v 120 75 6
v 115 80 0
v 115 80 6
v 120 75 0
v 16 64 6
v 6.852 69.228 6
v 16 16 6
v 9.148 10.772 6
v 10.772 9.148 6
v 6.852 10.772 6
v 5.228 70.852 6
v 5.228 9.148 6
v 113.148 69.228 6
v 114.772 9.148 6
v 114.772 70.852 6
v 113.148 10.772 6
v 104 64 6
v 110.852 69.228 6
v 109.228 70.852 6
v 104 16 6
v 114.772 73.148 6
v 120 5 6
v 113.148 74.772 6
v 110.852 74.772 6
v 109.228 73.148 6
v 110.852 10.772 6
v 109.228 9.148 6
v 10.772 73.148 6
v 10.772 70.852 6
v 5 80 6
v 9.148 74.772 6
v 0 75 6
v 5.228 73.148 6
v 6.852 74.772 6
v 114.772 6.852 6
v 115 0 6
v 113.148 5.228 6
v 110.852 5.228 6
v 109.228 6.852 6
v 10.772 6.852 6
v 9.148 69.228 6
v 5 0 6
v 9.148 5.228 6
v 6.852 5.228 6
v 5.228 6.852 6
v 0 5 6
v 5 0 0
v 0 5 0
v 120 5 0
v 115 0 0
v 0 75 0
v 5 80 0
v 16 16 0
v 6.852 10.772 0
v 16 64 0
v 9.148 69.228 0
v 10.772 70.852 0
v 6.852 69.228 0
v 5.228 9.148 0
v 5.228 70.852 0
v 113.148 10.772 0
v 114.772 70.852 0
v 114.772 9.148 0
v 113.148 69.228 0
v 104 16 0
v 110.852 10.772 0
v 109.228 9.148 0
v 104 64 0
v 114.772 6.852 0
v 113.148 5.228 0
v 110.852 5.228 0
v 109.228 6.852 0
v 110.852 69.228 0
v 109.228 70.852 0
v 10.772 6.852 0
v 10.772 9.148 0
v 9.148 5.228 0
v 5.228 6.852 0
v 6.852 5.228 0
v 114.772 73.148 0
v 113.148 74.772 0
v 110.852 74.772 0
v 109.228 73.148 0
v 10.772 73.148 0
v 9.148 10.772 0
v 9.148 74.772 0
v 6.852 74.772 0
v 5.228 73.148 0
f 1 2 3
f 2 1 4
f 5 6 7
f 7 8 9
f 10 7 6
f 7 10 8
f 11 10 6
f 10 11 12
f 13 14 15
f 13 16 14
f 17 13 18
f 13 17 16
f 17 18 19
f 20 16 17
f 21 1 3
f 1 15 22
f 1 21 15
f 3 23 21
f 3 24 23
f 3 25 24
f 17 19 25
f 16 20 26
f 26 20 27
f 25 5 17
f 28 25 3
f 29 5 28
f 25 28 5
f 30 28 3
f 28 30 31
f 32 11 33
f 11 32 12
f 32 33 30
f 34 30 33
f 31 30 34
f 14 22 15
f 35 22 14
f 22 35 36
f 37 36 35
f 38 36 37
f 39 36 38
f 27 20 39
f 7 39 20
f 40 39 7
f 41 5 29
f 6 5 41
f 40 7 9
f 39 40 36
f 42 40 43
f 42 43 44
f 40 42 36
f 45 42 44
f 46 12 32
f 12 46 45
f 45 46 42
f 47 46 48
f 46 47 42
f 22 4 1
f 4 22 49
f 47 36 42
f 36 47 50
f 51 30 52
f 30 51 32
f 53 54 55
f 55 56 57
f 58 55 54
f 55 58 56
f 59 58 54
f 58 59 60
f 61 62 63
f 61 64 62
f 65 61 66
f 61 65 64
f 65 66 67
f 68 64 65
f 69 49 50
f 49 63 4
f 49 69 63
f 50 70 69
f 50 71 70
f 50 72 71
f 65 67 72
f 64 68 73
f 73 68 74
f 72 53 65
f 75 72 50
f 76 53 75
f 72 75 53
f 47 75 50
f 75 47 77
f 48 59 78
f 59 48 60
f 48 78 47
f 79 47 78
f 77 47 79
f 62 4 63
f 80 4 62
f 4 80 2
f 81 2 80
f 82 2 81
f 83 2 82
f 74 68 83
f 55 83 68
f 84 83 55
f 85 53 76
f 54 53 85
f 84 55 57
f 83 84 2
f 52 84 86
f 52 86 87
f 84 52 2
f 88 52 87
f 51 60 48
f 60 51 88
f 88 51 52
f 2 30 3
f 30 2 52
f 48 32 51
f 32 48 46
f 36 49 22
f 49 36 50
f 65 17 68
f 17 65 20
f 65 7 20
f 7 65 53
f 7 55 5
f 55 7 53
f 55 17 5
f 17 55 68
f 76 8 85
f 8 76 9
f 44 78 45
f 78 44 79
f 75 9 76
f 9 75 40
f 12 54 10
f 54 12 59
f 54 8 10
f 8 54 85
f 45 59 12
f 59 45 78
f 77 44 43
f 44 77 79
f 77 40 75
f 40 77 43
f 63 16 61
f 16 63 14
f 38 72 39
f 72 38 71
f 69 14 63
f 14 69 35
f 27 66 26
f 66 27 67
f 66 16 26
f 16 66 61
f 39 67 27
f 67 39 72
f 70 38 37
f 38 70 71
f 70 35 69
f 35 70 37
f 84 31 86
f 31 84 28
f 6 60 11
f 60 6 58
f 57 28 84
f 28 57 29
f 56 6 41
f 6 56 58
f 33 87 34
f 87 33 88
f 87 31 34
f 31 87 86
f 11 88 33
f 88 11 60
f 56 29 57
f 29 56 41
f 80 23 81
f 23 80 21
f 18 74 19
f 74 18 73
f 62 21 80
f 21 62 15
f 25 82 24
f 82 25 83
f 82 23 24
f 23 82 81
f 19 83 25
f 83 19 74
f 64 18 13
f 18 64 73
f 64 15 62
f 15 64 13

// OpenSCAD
$fn = 32;

// ----------------------------------------------------------------------
// Frame plate: 120 x 80 frame, 16 mm rails
// ----------------------------------------------------------------------

// --- parameters (mm) ---
plate_l = 120;            // plate length, X
plate_w = 80;             // plate width, Y
plate_t = 6;              // plate thickness, Z (extrusion height)
corner_c = 5;             // corner chamfer
frame_bar = 16;           // frame rail width
bolt_r = 3;               // corner bolt window radius
bolt_inset = 8;           // bolt centre inset from the edges

win_l = plate_l - 2 * frame_bar;  // window length
win_w = plate_w - 2 * frame_bar;  // window width
bolt_d = 2 * bolt_r;  // corner hole diameter

profile = [[5, 0], [115, 0], [120, 5], [120, 75], [115, 80], [5, 80], [0, 75], [0, 5]];  // primary outline, 8 points, counter clockwise
void_1 = [[16, 16], [104, 16], [104, 64], [16, 64]];  // the window, 4 points
void_2 = [[10.772, 9.148], [9.148, 10.772], [6.852, 10.772], [5.228, 9.148], [5.228, 6.852], [6.852, 5.228], [9.148, 5.228], [10.772, 6.852]];  // corner bolt window, 8 points
void_3 = [[114.772, 9.148], [113.148, 10.772], [110.852, 10.772], [109.228, 9.148], [109.228, 6.852], [110.852, 5.228], [113.148, 5.228], [114.772, 6.852]];  // corner bolt window, 8 points
void_4 = [[10.772, 73.148], [9.148, 74.772], [6.852, 74.772], [5.228, 73.148], [5.228, 70.852], [6.852, 69.228], [9.148, 69.228], [10.772, 70.852]];  // corner bolt window, 8 points
void_5 = [[114.772, 73.148], [113.148, 74.772], [110.852, 74.772], [109.228, 73.148], [109.228, 70.852], [110.852, 69.228], [113.148, 69.228], [114.772, 70.852]];  // corner bolt window, 8 points

// --- the one profile operation ---
difference() {
  linear_extrude(height = plate_t) polygon(points = profile);
  translate([0, 0, -1])
    linear_extrude(height = plate_t + 2) polygon(points = void_1);
  translate([0, 0, -1])
    linear_extrude(height = plate_t + 2) polygon(points = void_2);
  translate([0, 0, -1])
    linear_extrude(height = plate_t + 2) polygon(points = void_3);
  translate([0, 0, -1])
    linear_extrude(height = plate_t + 2) polygon(points = void_4);
  translate([0, 0, -1])
    linear_extrude(height = plate_t + 2) polygon(points = void_5);
}
